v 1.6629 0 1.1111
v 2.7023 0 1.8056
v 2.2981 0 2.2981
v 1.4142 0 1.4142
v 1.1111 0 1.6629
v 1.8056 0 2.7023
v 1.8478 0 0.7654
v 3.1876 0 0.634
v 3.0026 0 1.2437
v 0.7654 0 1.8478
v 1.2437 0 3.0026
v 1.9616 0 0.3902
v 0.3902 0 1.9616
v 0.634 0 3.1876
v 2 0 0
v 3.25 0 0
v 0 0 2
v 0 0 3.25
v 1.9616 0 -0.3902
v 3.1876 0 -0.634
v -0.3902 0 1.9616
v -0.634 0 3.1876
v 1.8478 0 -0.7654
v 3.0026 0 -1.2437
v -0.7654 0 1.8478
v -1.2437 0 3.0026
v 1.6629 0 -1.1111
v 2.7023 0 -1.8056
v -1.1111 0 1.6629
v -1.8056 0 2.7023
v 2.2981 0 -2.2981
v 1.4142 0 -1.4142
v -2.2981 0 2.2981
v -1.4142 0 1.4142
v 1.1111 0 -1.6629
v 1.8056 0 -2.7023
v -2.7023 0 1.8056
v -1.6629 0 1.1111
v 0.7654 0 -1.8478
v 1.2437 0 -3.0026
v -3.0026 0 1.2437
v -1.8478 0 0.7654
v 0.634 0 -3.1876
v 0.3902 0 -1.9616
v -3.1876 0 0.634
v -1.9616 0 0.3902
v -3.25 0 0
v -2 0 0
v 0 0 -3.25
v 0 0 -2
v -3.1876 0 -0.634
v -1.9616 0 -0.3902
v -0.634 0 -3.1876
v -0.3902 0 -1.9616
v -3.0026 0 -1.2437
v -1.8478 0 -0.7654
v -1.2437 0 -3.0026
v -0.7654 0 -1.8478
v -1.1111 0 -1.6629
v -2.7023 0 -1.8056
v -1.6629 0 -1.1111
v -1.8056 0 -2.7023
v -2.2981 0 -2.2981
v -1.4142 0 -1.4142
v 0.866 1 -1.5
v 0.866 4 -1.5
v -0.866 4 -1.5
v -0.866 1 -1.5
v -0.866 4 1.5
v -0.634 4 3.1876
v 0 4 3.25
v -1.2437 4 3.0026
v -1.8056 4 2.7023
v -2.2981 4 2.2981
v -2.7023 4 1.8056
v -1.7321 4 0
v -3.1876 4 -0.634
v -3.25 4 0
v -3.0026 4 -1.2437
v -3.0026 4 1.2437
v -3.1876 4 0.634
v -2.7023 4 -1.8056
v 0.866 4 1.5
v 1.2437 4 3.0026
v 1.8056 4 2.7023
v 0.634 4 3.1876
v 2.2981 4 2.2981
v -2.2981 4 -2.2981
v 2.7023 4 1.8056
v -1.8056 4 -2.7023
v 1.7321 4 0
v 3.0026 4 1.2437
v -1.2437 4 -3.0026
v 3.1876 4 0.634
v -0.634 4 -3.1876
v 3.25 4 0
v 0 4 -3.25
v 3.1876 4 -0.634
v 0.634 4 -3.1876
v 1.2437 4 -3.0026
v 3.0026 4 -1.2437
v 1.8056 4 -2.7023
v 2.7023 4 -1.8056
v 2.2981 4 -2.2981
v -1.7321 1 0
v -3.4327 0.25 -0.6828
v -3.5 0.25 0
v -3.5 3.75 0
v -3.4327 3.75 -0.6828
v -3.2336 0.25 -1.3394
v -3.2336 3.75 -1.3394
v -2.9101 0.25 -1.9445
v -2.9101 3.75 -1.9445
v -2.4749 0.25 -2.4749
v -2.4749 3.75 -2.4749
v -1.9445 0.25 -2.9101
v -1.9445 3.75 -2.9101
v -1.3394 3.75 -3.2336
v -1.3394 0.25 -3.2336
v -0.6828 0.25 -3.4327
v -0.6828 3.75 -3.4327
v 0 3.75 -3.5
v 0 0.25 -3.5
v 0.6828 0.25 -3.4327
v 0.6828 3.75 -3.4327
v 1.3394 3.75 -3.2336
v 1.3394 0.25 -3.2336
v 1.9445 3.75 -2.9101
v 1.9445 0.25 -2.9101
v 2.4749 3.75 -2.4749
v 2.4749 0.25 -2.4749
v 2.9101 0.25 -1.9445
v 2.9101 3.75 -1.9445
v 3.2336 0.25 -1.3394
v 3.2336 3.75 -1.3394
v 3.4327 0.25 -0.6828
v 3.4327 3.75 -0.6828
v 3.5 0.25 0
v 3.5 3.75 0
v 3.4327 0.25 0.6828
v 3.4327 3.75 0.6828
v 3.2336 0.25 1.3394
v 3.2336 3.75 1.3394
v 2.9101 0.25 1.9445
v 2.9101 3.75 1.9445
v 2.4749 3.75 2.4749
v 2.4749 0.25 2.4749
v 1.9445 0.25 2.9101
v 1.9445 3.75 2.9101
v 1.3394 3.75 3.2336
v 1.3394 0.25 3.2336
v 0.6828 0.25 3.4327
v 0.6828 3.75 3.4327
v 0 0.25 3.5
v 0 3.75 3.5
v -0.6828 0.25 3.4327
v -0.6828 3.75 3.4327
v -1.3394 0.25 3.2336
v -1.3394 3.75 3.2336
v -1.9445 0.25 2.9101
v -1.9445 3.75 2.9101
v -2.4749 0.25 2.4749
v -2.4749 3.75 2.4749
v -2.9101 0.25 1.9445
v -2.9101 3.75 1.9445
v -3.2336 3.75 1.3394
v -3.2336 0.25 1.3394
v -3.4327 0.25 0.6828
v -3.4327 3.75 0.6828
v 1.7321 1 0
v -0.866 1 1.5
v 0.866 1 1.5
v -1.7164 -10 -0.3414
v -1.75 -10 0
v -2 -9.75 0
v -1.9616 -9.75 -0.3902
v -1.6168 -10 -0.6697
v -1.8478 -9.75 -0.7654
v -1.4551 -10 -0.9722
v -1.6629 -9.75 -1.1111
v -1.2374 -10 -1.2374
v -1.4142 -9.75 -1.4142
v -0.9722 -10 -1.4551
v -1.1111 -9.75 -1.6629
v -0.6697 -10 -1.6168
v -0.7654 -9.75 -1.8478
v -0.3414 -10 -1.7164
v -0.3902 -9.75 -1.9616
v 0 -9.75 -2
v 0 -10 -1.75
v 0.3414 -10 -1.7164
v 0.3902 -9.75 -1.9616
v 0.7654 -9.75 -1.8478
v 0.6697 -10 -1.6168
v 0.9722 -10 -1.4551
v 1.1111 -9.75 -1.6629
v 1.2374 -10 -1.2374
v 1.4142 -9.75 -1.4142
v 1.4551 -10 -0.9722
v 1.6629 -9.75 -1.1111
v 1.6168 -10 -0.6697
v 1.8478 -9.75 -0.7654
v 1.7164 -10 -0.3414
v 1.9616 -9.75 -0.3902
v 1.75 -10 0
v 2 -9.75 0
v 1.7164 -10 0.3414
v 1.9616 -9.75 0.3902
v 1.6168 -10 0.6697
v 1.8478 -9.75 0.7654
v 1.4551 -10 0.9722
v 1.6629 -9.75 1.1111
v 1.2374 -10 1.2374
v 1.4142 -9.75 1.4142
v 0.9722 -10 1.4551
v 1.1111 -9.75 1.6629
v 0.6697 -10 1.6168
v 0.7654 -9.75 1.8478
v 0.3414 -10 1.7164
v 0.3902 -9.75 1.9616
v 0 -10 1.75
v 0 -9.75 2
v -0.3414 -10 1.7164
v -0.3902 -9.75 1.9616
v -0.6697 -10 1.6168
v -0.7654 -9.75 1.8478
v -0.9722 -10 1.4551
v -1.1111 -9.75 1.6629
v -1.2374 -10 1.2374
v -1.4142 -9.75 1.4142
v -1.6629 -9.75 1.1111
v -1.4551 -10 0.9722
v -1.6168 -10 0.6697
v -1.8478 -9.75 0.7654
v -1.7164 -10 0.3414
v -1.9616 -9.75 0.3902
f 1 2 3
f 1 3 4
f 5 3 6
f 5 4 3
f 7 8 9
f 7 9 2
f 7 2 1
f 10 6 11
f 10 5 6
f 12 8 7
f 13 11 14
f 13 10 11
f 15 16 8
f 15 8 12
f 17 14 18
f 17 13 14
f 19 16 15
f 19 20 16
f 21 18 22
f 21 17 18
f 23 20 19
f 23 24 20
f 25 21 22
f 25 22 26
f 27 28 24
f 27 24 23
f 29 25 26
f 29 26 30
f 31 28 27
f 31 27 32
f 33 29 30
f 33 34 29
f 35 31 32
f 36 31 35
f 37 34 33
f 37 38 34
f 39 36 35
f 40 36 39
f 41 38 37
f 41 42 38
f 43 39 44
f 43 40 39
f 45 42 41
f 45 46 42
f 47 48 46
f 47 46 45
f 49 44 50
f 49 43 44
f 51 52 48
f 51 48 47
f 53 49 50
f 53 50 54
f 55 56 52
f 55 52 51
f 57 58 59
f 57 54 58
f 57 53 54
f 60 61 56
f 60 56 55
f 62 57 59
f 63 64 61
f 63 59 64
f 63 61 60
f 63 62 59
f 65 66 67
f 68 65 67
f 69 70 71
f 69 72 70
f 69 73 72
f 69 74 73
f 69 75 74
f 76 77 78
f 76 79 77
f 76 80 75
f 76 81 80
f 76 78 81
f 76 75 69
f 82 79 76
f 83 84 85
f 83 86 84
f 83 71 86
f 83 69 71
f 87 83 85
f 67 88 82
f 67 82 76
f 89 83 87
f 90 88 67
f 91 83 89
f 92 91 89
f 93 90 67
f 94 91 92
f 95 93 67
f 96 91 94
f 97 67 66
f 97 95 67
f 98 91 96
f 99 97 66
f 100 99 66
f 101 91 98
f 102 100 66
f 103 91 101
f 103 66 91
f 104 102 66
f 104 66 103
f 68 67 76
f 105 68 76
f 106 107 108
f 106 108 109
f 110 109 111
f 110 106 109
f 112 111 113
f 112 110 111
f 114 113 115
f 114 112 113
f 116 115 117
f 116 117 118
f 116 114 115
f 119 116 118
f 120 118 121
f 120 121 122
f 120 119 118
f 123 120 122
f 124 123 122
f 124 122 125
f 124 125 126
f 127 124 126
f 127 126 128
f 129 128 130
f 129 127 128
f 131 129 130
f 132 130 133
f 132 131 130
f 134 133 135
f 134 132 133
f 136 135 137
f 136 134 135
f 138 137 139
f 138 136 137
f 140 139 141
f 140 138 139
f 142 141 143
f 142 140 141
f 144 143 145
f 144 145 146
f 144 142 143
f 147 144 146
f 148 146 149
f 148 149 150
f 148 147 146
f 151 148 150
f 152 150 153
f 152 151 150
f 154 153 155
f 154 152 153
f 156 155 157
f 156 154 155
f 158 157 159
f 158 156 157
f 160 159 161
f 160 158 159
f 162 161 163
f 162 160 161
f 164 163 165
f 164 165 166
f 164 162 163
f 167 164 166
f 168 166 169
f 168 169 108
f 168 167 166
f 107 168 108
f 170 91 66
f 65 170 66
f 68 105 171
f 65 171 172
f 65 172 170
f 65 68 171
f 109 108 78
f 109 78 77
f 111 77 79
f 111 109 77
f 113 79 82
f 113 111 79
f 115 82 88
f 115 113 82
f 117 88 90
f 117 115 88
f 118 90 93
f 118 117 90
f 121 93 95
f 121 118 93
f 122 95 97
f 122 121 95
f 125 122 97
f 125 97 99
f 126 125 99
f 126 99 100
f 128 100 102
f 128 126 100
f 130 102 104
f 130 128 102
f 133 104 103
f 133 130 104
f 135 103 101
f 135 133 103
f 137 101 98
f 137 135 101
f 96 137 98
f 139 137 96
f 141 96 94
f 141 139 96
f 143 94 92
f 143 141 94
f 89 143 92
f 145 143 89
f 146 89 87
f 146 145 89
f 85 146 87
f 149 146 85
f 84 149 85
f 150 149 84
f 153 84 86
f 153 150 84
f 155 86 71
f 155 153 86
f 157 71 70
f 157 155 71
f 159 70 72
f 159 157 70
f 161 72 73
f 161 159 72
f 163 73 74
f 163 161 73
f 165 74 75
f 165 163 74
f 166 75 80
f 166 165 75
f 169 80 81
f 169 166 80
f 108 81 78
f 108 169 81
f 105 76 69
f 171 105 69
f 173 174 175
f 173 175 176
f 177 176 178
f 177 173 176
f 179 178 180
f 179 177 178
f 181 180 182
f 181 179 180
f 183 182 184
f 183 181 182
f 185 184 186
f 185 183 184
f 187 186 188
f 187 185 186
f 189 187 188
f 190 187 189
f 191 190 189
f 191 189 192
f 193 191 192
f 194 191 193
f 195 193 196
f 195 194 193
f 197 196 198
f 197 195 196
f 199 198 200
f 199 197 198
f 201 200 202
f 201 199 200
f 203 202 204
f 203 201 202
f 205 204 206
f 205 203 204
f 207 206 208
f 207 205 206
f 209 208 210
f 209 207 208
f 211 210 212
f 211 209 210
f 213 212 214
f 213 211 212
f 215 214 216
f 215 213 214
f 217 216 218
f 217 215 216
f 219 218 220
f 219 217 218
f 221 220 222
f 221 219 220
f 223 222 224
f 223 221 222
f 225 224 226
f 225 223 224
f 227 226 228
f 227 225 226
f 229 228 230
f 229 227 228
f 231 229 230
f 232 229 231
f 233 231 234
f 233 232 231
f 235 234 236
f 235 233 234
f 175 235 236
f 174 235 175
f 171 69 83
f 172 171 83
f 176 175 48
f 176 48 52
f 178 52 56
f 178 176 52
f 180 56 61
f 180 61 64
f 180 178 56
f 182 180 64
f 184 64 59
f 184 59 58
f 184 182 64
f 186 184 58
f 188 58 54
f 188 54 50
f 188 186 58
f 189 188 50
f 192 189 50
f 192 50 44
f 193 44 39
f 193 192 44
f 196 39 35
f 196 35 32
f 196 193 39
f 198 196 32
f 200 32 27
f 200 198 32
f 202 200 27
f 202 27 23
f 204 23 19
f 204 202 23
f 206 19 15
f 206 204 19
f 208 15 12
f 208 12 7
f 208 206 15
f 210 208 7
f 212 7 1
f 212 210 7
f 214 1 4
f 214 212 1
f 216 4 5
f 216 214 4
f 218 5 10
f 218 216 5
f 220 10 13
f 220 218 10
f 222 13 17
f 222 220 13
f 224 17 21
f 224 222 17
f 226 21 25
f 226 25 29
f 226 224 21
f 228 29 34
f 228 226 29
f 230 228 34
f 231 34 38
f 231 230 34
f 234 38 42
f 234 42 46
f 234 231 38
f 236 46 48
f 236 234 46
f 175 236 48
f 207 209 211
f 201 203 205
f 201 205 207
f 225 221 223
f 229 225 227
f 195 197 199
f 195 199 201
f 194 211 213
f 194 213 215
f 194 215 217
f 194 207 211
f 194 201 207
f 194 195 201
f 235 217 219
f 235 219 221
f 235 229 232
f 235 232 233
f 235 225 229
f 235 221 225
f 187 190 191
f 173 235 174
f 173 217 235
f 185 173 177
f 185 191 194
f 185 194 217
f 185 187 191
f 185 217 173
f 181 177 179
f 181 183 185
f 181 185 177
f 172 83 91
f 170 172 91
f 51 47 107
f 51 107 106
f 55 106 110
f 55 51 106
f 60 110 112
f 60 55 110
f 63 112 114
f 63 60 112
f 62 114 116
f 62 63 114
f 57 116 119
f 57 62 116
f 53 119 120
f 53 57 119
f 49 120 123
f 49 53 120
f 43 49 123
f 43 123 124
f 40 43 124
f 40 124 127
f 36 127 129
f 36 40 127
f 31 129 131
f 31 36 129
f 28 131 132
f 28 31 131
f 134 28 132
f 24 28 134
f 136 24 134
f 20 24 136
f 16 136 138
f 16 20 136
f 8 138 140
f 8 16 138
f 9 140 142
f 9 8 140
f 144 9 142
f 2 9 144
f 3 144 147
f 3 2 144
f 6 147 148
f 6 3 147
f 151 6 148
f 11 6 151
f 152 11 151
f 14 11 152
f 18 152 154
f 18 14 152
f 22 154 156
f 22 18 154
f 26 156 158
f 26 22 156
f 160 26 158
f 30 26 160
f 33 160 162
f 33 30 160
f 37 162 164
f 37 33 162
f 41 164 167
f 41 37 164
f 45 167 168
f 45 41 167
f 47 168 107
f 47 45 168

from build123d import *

# Parameters (mm, degrees)
CUT_EXTRUDE1_DEPTH = 3
CHAMFER1_SIZE      = 0.25


with BuildPart() as part:
    # Sketch1 → Revolve1 (revolve)
    with BuildSketch(Plane.XY):
        Polygon((0, 4), (-3.5, 4), (-3.5, 0), (-2, 0), (-2, -10), (0, -10), (0, 0), align=None)
    revolve(axis=Axis((0, -10, 0), (0, -1, 0)))

    # Sketch2 → Cut-Extrude1 (cut)
    with BuildSketch(Plane(origin=(0, 4, 0), x_dir=(1, 0, 0), z_dir=(0, 1, 0))):
        Polygon((0.866025404, 1.5), (-0.866025404, 1.5), (-1.732050808, 0), (-0.866025404, -1.5), (0.866025404, -1.5), (1.732050808, 0), align=None)
    extrude(amount=-CUT_EXTRUDE1_DEPTH, mode=Mode.SUBTRACT)

    # Chamfer1
    chamfer1_edges = [part.edges().sort_by_distance(p)[0] for p in [
        (2, -10, 0),
        (3.5, 0, 0),
        (3.5, 4, 0),
    ]]
    chamfer(chamfer1_edges, length=CHAMFER1_SIZE)


solid = part.part
